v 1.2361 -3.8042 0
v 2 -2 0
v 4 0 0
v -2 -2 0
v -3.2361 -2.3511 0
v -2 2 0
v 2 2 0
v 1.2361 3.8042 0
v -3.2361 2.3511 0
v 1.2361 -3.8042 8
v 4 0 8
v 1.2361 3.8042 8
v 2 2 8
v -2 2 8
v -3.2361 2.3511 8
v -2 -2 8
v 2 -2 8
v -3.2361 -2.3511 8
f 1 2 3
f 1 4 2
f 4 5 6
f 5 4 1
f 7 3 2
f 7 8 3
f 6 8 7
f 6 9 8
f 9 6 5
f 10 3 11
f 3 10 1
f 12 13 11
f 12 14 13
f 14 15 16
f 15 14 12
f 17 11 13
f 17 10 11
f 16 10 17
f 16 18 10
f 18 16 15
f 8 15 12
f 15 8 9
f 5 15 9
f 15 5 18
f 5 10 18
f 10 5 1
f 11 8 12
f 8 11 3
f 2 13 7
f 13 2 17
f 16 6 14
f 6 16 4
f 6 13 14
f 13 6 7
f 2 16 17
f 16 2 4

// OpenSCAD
// [FL_INDEX: keywords="openscad, 3d_parametric, Adapter, csg_solid" | COT="Parametric OpenSCAD design from 3DCodeverse"]
// Title: Adapter

//Outside Shape
outside_shape = 3; // [1:Cylinder, 2:Square, 3:Polygon]

//Inside Shape
inside_shape = 2; // [1:Cylinder, 2:Square, 3:Polygon]

//Outside Polygon sides
outside_polysides = 5; // [5:20]

//Inside Polygon sides
inside_polysides = 5; // [5:20]

//Height
height=8; // [5:50]

//Diameter of Inner Polygon
inside_diameter = 4;

//Diameter of Outer Polygon
outside_diameter = 8;



/* [Hidden] */
$fn=60;


	if (outside_shape == 1){
		if (inside_shape == 1){
			cyl_cyl();
		} else if (inside_shape == 2){
			cyl_squ();
		} else if (inside_shape == 3){
			cyl_poly();
		} else{
			cyl_cyl();
		}
	} else if (outside_shape == 2){
		if (inside_shape == 1){
			squ_cyl();
		} else if (inside_shape == 2){
			squ_squ();
		} else if (inside_shape == 3){
			squ_poly();
		} else{
			squ_cyl();
		}
	} else if (outside_shape == 3){
		if (inside_shape == 1){
			poly_cyl();
		} else if (inside_shape == 2){
			poly_squ();
		} else if (inside_shape == 3){
			poly_poly();
		} else{
			poly_cyl();
		}
	} else{
		cyl_cyl();
	}


//Cylinders

module cyl_cyl(){

	difference() {
	
		cylinder(height,outside_diameter/2,outside_diameter/2);
		cylinder(height,inside_diameter/2,inside_diameter/2);
	
	}

}

module cyl_squ(){

	difference() {
	
		cylinder(height,outside_diameter/2,outside_diameter/2,true);
		translate([-inside_diameter/2,-inside_diameter/2,-height/2])cube([inside_diameter,inside_diameter,height]);
	
	}

}

module cyl_poly(){

	difference() {
	
		cylinder(height,outside_diameter/2,outside_diameter/2);
		linear_extrude(height) circle(inside_diameter/2,$fn=inside_polysides);	
	
	}

}

//Squares

module squ_cyl(){

	difference() {
	
		translate([-outside_diameter/2,-outside_diameter/2,0])cube([outside_diameter,outside_diameter,height]);
		cylinder(height,inside_diameter/2,inside_diameter/2);
	
	}

}

module squ_squ(){

	difference() {
	
		cube([outside_diameter,outside_diameter,height]);
		translate([outside_diameter/2 - inside_diameter/2,outside_diameter/2 - inside_diameter/2,0])cube([inside_diameter,inside_diameter,height]);
	
	}

}

module squ_poly(){

	difference() {
	
		translate([-outside_diameter/2,-outside_diameter/2,0])cube([outside_diameter,outside_diameter,height]);
		linear_extrude(height) circle(inside_diameter/2,$fn=inside_polysides);	
	
	}

}

//Polygons

module poly_cyl(){

	difference() {
	
		linear_extrude(height) circle(outside_diameter/2,$fn=outside_polysides);
		cylinder(height,inside_diameter/2,inside_diameter/2);
	
	}

}

module poly_squ(){

	difference() {
	
		linear_extrude(height) circle(outside_diameter/2,$fn=outside_polysides);
		translate([-inside_diameter/2,-inside_diameter/2,0])cube([inside_diameter,inside_diameter,height]);
	
	}

}

module poly_poly(){

	difference() {
	
		linear_extrude(height) circle(outside_diameter/2,$fn=outside_polysides);
		linear_extrude(height) circle(inside_diameter/2,$fn=inside_polysides);	
	
	}

}
